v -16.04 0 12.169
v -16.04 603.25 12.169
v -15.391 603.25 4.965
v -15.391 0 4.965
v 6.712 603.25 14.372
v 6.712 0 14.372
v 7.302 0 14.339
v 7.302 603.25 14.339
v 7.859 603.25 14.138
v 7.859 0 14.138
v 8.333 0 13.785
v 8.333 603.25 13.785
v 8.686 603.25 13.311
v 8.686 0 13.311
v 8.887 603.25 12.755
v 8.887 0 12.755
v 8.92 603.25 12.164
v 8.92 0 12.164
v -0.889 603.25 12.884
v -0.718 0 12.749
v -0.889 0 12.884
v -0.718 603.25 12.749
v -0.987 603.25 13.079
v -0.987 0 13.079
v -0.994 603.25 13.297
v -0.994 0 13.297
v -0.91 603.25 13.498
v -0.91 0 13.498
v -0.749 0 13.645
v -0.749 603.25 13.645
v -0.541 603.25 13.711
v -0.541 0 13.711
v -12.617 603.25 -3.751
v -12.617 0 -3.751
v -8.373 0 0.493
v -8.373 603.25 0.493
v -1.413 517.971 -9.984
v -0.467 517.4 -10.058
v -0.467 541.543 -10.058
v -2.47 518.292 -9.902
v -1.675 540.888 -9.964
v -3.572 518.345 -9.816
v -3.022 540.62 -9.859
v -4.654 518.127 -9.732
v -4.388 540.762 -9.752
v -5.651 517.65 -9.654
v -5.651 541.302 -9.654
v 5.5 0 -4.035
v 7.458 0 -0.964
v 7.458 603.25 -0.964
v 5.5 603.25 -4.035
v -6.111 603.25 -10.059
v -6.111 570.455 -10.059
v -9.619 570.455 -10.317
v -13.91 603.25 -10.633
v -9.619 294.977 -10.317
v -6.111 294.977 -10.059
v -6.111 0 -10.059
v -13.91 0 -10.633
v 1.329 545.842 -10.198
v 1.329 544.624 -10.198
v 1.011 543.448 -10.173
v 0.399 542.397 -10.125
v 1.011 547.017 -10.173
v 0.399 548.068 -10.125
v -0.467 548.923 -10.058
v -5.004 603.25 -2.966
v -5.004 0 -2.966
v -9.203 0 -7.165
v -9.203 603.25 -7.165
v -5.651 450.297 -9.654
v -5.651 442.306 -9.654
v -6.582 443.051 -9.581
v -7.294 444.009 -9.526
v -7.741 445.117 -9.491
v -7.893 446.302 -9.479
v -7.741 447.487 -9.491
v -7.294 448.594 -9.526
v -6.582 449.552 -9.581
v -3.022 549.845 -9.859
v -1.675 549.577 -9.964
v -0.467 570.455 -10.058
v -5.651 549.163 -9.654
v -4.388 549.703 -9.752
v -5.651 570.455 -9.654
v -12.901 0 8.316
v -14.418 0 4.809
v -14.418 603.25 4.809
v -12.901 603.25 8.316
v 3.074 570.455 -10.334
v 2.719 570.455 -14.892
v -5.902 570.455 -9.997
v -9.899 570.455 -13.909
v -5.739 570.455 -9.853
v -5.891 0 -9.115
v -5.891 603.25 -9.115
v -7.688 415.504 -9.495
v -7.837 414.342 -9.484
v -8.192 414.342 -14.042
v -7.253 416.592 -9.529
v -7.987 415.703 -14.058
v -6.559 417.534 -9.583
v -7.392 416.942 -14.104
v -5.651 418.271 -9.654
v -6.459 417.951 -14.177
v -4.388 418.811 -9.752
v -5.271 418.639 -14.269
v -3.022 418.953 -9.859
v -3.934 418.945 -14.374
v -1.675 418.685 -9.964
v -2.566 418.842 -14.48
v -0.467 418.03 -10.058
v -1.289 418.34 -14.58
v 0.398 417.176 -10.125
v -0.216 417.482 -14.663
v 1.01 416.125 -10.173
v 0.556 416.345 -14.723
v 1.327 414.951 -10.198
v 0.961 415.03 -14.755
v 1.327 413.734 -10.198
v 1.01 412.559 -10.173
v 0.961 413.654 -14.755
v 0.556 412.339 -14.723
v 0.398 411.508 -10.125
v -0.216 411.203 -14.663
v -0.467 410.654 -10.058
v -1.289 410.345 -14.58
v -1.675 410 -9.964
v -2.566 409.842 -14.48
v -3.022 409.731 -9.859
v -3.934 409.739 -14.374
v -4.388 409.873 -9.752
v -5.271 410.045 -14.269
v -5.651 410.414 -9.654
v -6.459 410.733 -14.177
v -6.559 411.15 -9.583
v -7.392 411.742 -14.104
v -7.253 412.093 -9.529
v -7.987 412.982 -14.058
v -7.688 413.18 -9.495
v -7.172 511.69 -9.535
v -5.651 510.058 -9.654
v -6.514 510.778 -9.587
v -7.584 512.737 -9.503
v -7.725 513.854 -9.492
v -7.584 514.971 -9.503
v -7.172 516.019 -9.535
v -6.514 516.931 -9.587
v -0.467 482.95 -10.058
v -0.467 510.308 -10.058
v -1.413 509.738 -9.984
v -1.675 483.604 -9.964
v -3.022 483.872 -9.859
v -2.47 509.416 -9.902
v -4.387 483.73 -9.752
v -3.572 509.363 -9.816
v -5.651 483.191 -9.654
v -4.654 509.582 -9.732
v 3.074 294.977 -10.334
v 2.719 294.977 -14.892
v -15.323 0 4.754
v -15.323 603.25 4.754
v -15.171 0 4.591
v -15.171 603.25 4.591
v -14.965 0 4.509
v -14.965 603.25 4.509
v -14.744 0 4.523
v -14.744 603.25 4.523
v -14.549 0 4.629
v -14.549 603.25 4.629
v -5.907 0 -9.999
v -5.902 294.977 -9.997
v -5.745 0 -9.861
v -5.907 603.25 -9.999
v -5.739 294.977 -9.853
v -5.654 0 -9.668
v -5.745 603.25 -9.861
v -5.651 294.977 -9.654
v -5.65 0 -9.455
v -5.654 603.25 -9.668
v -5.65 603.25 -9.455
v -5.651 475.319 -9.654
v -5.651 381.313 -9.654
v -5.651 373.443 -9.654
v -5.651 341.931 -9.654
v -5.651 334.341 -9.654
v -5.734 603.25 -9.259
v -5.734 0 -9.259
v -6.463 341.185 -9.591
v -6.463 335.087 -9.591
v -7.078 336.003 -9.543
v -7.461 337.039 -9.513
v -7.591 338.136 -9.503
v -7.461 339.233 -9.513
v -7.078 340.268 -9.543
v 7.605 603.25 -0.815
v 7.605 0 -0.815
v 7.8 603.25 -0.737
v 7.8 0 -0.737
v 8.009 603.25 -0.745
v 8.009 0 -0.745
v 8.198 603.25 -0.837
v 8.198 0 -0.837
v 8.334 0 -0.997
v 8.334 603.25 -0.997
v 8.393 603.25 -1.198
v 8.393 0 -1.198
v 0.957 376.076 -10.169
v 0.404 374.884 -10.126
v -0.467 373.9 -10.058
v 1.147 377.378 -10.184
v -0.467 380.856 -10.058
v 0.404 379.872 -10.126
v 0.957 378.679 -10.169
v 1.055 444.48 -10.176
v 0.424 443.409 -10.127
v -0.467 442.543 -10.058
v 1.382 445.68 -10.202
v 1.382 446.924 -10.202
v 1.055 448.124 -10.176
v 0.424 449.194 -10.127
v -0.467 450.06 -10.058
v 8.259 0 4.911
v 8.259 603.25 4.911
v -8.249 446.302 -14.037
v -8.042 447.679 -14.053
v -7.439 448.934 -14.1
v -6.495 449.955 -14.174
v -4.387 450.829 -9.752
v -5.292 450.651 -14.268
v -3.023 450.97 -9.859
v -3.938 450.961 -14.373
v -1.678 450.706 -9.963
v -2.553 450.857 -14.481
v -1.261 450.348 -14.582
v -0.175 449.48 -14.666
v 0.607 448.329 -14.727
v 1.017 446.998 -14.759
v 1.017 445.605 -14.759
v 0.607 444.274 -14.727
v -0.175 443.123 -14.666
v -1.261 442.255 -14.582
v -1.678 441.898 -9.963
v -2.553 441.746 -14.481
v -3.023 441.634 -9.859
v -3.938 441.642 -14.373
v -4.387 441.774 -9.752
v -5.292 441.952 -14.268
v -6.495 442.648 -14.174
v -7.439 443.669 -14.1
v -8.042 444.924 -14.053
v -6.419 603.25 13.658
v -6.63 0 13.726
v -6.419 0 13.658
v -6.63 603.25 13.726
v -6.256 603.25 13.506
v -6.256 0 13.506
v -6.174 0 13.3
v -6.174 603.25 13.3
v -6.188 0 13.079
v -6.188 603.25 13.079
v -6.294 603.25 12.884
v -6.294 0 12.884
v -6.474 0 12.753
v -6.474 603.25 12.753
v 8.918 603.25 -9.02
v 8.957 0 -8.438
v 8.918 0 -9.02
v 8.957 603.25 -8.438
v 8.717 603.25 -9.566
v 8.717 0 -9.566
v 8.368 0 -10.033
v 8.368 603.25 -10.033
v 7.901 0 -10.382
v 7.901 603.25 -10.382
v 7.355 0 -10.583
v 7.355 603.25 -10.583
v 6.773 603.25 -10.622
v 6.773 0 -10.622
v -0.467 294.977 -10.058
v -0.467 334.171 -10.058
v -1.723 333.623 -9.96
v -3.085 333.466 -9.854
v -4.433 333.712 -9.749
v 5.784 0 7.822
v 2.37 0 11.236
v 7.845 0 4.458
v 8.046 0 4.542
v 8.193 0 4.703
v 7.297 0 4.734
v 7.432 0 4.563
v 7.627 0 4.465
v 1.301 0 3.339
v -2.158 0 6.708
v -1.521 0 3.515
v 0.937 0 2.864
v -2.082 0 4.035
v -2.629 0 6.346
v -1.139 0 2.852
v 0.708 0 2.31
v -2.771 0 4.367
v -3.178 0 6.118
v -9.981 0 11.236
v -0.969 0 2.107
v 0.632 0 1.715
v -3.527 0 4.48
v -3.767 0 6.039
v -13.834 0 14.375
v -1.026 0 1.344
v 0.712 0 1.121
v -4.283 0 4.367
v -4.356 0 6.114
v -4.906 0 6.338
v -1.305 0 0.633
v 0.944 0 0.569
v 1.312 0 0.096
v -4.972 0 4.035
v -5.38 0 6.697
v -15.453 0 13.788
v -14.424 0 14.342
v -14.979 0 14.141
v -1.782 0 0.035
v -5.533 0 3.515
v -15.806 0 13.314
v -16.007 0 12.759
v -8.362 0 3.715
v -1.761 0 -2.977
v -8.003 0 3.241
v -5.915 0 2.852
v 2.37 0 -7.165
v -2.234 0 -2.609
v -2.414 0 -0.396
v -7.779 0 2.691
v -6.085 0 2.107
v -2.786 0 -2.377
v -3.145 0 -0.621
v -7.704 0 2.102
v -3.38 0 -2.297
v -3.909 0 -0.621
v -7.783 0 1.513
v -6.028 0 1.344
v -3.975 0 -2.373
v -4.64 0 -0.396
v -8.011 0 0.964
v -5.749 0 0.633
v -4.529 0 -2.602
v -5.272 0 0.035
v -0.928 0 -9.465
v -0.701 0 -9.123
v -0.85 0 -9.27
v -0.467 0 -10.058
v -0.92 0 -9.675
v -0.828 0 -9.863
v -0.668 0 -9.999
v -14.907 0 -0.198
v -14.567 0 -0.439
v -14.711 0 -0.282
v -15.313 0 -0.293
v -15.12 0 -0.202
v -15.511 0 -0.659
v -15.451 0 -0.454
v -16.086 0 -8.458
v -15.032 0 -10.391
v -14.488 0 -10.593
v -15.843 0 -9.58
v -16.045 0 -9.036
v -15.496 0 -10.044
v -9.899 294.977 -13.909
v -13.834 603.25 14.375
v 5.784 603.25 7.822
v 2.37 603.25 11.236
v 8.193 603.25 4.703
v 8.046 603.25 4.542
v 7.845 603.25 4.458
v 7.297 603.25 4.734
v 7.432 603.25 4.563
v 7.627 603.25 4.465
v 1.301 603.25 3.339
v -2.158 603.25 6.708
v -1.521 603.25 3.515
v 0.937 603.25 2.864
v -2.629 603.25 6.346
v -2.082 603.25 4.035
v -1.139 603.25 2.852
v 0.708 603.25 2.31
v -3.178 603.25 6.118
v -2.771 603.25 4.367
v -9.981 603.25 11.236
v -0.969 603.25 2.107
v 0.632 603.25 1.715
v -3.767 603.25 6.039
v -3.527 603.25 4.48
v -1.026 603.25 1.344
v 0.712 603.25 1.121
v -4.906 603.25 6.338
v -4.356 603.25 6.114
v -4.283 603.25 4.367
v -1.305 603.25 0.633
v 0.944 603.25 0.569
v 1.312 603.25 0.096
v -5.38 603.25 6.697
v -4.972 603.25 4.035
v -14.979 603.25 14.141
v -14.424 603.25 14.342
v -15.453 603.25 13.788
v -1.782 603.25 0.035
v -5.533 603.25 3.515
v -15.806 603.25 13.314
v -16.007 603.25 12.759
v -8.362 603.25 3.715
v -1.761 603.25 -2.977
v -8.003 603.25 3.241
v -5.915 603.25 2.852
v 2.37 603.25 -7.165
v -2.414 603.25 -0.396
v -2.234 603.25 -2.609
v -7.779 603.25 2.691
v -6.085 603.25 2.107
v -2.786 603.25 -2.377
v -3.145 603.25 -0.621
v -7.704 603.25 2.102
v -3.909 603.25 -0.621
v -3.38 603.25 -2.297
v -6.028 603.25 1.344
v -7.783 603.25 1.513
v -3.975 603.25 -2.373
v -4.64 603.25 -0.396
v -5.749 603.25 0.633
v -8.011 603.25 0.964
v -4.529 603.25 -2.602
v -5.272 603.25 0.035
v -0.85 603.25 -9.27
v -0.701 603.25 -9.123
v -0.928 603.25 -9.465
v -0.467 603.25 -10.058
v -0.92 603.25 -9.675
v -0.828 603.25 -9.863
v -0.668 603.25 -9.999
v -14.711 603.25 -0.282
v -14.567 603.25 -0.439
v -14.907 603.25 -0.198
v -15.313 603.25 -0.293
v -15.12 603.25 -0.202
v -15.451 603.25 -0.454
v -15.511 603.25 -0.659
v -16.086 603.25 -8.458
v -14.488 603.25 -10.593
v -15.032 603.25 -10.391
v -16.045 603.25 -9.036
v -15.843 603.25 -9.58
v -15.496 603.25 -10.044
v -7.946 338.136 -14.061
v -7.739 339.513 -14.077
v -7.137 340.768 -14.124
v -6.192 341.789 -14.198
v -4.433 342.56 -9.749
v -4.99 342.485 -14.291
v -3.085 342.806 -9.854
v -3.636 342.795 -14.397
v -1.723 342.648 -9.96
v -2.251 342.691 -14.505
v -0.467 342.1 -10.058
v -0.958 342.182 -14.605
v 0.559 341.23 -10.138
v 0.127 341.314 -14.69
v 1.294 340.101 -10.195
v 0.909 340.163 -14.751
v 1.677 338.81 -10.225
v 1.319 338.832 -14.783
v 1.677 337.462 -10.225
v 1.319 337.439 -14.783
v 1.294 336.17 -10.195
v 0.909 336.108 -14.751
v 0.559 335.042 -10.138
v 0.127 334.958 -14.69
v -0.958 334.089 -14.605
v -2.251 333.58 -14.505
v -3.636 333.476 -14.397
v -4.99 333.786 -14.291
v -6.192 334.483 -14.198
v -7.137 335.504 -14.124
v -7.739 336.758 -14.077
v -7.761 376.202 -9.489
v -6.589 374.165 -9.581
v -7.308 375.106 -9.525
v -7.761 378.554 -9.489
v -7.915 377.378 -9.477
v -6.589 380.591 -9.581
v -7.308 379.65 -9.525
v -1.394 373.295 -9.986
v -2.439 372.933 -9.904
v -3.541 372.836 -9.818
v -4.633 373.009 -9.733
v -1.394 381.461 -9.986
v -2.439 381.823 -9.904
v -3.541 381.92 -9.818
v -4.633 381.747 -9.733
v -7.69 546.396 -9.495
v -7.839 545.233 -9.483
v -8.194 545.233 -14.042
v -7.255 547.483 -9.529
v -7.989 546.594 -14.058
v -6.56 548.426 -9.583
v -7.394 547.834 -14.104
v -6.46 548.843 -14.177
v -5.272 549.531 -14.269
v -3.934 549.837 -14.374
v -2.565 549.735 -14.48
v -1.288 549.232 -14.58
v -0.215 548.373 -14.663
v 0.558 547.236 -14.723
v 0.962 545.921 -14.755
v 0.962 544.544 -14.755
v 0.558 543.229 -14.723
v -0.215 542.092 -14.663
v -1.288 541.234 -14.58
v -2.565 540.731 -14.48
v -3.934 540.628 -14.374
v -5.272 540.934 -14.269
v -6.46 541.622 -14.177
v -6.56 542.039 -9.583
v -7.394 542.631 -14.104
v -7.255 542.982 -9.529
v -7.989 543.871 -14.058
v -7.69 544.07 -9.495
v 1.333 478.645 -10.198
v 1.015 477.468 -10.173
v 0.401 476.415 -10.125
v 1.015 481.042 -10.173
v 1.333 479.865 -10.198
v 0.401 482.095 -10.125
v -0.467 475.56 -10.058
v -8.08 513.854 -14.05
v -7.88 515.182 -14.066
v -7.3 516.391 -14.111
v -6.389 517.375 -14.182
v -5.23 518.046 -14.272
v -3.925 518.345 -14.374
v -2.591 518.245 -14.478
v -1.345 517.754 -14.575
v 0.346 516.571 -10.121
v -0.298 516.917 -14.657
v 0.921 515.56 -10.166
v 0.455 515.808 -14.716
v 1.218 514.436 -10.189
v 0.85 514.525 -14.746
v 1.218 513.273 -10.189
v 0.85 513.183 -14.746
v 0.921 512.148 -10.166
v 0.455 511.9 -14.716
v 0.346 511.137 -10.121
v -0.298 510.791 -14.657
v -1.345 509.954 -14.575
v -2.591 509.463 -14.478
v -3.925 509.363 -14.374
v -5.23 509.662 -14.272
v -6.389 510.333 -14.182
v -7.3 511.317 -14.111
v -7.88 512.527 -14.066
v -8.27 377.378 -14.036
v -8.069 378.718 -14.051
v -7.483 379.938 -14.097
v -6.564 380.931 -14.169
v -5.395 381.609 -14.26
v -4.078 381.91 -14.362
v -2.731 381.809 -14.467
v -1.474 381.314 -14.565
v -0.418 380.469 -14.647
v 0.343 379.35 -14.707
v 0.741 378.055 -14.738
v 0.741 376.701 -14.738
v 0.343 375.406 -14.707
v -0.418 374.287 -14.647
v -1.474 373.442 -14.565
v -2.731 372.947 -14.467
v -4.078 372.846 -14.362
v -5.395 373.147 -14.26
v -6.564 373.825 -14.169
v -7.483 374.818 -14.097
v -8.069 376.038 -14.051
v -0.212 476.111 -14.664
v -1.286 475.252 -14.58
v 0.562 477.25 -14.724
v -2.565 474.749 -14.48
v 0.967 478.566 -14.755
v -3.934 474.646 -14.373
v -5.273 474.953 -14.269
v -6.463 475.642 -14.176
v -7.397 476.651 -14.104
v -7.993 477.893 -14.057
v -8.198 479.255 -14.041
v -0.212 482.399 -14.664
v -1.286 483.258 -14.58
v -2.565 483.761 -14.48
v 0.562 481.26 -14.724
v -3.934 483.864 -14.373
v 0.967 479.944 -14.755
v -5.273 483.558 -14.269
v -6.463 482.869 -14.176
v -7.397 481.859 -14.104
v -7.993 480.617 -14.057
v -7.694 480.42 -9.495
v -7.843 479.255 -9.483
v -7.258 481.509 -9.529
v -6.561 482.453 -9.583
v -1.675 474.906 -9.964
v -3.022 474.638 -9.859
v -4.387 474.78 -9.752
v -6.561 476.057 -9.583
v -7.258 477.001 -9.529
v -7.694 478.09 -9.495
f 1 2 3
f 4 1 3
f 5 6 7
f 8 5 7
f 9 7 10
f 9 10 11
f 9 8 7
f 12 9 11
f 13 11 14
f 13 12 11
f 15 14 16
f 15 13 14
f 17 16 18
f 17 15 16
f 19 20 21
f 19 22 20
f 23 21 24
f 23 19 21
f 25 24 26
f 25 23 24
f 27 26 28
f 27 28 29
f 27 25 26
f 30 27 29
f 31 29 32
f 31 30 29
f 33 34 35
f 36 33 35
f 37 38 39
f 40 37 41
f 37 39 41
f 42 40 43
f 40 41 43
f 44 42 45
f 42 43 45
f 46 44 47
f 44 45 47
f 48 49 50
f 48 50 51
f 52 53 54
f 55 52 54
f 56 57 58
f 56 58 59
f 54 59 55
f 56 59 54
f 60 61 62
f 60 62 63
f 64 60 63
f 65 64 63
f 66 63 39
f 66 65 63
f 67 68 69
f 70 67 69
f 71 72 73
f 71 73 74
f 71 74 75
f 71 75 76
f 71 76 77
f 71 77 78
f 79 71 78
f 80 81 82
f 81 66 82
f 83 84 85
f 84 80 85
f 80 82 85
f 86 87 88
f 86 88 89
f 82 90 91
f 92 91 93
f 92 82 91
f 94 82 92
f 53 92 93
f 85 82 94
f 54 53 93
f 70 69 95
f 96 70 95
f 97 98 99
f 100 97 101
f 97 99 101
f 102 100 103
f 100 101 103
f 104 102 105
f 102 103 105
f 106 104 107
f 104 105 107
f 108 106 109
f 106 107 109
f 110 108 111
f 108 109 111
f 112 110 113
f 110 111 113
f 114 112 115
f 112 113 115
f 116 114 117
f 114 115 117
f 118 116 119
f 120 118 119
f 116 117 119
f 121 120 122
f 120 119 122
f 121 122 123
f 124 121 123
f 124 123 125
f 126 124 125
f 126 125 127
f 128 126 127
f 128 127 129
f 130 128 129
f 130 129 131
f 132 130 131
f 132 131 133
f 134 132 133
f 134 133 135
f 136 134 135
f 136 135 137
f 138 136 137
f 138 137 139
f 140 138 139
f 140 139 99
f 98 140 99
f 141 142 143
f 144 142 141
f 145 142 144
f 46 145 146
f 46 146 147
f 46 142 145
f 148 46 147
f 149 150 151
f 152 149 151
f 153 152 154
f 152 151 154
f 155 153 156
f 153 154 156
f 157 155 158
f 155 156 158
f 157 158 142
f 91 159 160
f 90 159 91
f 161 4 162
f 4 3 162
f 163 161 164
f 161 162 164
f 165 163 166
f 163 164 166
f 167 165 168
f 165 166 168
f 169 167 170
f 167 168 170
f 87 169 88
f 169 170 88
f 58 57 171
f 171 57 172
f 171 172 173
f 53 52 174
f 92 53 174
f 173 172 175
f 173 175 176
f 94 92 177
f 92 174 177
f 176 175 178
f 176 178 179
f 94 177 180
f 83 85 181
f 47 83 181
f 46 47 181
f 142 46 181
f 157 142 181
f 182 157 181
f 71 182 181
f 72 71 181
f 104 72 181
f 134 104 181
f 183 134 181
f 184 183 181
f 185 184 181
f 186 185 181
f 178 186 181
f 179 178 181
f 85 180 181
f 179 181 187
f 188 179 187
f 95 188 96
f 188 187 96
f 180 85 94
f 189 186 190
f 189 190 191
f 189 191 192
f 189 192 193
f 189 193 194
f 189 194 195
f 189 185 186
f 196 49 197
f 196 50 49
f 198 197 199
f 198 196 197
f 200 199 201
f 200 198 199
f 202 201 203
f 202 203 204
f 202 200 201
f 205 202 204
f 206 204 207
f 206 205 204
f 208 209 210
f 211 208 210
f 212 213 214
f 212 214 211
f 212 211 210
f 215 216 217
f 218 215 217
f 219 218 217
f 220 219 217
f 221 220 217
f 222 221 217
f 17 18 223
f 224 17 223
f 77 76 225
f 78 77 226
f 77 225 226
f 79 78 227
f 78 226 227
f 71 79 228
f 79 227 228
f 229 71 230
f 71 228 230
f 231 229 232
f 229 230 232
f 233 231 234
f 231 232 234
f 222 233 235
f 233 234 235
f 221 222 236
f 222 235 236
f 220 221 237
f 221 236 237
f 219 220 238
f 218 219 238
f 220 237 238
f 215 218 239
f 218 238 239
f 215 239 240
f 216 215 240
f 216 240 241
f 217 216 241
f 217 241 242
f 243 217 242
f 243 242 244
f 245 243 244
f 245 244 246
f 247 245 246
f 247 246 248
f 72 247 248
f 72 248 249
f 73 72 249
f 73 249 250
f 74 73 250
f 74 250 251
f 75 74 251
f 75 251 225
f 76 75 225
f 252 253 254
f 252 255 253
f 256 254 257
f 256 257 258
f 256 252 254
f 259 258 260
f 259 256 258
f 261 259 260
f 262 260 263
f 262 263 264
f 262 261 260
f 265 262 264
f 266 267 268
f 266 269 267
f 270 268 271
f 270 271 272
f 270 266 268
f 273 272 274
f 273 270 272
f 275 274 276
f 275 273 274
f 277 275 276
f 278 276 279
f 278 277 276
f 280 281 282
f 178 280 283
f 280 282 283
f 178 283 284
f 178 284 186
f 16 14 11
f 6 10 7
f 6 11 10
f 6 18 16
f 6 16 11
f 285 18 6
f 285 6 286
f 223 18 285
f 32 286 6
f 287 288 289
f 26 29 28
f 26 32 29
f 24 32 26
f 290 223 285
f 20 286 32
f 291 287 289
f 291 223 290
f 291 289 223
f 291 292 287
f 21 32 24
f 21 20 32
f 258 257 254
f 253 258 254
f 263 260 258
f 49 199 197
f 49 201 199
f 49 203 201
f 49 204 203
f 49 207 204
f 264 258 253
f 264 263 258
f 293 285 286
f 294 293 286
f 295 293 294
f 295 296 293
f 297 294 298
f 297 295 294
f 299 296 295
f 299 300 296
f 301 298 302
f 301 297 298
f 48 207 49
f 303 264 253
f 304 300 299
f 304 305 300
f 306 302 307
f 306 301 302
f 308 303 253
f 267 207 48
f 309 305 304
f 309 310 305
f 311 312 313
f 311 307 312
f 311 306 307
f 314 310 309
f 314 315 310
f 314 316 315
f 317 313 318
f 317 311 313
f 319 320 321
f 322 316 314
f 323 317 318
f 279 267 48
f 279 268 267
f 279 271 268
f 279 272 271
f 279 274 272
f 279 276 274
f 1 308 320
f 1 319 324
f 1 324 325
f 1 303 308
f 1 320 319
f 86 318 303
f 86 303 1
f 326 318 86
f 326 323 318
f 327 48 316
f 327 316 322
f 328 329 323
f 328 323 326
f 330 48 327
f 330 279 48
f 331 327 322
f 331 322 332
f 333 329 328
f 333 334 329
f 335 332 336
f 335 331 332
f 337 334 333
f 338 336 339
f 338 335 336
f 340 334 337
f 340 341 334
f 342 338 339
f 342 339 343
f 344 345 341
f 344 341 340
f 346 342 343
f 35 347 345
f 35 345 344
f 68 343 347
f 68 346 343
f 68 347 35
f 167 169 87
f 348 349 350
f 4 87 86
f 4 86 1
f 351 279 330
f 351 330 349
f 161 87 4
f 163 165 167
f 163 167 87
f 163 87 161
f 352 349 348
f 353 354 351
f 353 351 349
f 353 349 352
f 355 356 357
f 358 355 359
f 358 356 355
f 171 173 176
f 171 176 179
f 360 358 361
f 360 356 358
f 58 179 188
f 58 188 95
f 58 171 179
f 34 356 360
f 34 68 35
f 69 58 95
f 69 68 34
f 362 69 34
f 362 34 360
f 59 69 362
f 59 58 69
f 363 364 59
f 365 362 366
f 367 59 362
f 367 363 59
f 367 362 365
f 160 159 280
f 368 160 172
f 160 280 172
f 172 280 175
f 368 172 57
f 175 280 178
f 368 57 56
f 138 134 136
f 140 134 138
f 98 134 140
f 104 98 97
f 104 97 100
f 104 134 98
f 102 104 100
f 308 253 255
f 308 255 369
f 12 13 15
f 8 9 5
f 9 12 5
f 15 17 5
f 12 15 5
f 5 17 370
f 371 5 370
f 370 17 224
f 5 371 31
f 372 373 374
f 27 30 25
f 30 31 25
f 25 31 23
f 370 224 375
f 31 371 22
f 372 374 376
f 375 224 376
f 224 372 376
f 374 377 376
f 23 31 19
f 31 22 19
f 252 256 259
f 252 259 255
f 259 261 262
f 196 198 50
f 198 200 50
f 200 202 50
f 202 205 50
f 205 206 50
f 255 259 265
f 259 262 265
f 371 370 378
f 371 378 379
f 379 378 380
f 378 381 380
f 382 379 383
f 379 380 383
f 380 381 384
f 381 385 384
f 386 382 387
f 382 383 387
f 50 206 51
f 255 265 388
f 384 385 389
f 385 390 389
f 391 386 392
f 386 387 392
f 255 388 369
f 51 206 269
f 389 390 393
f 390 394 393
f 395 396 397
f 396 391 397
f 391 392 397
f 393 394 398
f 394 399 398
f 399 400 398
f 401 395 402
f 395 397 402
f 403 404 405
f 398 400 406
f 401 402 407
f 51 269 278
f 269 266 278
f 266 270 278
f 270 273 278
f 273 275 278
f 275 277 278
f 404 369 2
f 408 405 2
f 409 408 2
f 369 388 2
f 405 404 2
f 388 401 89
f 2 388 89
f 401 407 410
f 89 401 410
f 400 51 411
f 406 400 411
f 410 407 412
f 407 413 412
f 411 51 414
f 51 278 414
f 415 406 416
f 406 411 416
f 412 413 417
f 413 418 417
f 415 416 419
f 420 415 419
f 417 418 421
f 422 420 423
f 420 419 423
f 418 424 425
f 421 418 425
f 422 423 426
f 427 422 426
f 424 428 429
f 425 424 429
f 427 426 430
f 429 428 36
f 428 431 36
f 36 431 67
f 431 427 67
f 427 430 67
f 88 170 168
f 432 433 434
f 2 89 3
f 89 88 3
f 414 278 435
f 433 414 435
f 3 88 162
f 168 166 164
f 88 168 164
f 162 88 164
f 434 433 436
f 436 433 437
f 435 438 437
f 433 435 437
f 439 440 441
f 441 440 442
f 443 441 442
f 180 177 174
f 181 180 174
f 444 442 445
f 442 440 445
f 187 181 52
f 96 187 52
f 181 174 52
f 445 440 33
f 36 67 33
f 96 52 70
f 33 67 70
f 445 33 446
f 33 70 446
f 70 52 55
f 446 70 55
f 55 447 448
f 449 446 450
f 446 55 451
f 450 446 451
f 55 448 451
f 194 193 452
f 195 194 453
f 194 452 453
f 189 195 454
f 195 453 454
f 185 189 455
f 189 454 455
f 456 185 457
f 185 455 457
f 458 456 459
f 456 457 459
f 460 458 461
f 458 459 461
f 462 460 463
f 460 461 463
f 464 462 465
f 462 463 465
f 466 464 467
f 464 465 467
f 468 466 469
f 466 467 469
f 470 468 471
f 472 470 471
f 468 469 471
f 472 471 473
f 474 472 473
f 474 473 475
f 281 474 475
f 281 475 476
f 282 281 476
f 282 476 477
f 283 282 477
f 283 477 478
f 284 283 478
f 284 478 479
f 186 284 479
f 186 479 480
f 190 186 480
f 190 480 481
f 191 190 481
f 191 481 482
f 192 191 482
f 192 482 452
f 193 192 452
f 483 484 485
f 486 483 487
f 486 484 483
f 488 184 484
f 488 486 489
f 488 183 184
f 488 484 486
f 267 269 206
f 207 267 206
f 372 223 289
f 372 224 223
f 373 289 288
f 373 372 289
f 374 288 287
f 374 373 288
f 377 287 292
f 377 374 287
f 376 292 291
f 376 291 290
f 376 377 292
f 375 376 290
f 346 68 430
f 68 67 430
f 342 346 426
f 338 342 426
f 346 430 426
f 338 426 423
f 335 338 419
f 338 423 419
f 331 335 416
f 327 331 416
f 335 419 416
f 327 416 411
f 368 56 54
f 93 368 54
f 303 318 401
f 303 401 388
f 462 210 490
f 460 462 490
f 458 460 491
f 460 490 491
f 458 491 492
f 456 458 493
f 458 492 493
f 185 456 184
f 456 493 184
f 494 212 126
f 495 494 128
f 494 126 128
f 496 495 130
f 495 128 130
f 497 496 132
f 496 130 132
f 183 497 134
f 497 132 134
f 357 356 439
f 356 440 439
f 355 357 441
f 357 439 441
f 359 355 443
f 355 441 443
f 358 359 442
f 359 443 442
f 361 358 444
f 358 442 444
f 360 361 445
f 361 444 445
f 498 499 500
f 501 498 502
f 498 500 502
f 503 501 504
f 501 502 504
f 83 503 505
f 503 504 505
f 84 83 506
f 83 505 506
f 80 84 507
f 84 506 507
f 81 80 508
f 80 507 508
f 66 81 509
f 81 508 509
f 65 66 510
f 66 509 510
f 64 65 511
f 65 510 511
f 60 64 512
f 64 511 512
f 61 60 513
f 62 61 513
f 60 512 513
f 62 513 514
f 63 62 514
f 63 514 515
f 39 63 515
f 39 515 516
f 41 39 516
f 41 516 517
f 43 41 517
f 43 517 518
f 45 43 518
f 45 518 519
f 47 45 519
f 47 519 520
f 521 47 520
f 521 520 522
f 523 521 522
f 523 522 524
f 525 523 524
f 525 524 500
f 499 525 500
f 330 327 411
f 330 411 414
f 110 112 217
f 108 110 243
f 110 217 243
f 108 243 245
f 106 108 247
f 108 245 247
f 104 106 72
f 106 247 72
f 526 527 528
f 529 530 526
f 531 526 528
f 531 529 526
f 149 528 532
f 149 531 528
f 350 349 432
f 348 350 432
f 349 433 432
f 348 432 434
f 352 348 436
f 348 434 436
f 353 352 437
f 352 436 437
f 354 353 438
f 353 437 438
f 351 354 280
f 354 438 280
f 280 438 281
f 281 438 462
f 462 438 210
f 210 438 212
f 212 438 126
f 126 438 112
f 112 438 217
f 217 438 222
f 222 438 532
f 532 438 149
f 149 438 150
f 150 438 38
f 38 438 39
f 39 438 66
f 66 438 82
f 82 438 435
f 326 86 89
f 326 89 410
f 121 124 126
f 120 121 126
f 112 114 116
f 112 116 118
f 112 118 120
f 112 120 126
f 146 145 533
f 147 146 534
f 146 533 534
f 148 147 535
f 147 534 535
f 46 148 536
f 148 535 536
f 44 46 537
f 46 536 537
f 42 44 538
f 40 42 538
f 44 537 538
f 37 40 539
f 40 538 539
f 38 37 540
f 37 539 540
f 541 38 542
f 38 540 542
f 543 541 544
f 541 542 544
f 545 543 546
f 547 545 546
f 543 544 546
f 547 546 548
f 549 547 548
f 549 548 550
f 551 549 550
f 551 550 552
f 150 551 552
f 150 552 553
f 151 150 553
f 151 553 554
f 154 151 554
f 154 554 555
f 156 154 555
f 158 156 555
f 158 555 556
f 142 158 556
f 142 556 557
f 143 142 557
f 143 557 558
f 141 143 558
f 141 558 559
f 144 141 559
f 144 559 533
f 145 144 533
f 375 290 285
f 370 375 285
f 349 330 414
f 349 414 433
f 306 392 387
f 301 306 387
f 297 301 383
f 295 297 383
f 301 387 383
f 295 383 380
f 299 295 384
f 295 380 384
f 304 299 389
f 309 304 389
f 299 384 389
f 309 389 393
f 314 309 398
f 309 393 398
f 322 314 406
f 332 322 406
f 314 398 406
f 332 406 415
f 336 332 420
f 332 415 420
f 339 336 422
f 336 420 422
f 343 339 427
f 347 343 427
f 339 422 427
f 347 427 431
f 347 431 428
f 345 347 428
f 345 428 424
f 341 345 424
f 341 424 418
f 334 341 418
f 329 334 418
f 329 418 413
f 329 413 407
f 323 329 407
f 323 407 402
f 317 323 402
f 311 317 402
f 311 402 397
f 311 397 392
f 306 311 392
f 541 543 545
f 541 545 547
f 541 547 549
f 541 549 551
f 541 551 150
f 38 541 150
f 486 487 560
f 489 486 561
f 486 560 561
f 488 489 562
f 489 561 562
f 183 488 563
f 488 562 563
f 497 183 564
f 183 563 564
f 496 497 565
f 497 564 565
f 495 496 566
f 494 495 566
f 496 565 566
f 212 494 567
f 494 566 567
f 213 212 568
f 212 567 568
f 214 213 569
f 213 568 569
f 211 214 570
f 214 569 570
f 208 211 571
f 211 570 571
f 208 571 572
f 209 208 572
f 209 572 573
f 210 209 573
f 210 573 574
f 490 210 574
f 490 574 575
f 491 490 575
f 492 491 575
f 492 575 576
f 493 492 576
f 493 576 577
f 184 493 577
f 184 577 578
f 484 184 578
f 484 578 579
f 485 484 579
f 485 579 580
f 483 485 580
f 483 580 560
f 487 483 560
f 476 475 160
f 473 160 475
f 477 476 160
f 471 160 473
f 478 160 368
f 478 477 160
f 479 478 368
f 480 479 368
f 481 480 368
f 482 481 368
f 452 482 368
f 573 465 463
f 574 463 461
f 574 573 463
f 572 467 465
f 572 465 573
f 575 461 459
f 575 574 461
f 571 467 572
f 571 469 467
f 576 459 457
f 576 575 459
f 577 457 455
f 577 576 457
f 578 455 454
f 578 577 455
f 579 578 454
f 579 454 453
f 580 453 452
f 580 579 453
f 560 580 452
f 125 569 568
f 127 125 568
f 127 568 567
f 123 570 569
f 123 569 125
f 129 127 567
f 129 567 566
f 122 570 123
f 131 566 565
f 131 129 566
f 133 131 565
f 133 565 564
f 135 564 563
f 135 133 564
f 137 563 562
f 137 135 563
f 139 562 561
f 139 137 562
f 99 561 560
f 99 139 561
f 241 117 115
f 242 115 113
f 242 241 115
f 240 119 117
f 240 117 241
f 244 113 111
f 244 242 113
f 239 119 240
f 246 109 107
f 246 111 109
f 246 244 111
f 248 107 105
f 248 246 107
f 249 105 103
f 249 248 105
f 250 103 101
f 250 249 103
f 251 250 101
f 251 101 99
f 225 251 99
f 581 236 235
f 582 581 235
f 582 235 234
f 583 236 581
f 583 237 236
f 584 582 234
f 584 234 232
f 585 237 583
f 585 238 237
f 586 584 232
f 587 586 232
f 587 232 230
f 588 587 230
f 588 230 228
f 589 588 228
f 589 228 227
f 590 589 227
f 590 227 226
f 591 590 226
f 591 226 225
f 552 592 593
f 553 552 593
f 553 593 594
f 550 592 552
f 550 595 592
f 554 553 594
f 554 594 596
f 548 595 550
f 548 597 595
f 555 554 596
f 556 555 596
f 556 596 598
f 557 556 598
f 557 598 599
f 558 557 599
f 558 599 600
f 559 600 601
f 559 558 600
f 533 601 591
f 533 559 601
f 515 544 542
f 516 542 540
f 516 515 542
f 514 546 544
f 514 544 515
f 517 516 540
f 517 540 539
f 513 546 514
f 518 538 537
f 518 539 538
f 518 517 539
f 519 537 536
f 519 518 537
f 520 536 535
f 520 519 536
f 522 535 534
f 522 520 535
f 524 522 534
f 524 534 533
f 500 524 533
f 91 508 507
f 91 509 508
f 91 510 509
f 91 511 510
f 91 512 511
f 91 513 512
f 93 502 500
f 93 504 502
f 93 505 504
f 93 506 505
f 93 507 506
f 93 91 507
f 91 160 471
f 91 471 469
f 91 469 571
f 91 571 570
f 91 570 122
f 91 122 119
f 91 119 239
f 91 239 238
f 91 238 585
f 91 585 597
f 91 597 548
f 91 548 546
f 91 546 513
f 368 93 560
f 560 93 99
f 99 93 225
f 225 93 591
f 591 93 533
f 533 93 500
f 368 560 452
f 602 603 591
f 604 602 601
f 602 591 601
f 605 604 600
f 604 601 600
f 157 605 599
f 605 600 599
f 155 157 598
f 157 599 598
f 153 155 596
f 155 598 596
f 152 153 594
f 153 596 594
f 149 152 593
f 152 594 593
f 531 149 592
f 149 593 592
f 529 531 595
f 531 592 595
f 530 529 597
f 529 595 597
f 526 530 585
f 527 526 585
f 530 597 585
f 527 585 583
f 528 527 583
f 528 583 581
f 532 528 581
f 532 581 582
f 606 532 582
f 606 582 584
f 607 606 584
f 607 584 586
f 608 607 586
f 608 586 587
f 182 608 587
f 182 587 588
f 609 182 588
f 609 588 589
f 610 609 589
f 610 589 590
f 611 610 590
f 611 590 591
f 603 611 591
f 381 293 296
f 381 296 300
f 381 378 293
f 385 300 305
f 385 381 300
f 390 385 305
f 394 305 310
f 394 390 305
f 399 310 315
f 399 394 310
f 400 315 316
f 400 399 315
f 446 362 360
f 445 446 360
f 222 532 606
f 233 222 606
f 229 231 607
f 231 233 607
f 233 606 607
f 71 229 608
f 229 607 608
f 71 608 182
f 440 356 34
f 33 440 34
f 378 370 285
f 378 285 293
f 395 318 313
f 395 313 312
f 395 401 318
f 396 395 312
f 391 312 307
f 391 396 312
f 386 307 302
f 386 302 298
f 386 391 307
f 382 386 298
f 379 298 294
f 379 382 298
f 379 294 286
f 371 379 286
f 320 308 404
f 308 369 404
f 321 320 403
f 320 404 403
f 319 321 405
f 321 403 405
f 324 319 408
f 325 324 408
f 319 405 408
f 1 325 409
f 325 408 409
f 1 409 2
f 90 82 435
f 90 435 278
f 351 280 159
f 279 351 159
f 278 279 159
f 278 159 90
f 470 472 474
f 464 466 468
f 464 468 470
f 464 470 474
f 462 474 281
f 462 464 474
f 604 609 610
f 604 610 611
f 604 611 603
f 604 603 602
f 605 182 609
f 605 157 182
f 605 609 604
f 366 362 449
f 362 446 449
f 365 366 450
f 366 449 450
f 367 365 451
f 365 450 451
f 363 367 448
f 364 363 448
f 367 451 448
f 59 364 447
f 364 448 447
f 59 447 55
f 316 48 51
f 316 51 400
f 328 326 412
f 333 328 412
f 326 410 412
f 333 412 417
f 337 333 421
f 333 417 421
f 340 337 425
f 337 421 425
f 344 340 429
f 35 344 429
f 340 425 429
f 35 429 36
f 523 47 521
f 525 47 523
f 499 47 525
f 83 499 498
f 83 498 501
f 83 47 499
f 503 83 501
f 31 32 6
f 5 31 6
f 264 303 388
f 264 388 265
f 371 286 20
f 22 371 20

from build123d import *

# Parameters (mm, degrees)
BOSS_EXTRUDE1_DEPTH = 603.25
SKETCH8_R           = 2.565266714
CUT_EXTRUDE4_DEPTH  = 604.996
FILLET1_R           = 2.032
FILLET2_R           = 0.508
SKETCH5_W           = 12.655737404
SKETCH5_H           = 275.477439744
BOSS_EXTRUDE3_DEPTH = 4.572
SKETCH6_R           = 4.617709461
SKETCH6_R_2         = 4.503643825
SKETCH6_R_3         = 4.621904919
SKETCH6_R_4         = 4.672748293
SKETCH6_R_5         = 4.615964847
CUT_EXTRUDE2_DEPTH  = 4.572
SKETCH7_R           = 4.54487388
SKETCH7_R_2         = 4.672668652
CUT_EXTRUDE3_DEPTH  = 4.572
FILLET3_R           = 2.286


with BuildPart() as part:
    # Sketch2 → Boss-Extrude1 (new body)
    with BuildSketch(Plane(origin=(0, 0, 0), x_dir=(1, 0, 0), z_dir=(0, 1, 0))):
        Polygon((-16.258611825, -14.593573265), (-15.211300169, -2.97584616), (-12.901409331, -8.316313776), (2.370242199, 7.164742979), (-1.981461576, 9.939777323), (9.141388175, 10.806426735), (8.274738763, -0.316423015), (5.499704418, 4.03528076), (-9.981352337, -11.236370771), (-4.640884721, -13.546261608), align=None)
        Polygon((-15.391962413, -0.962649654), (-12.616928069, 3.750799497), (2.370242199, -11.236370771), (-2.346798037, -13.546261608), (9.141388175, -14.593573265), (8.094076519, -3.105387053), (5.784185681, -7.822427289), (-9.202984587, 7.164742979), (-4.489535436, 9.939777323), (-16.258611825, 10.806426735), align=None)
    extrude(amount=BOSS_EXTRUDE1_DEPTH)

    # Sketch8 → Cut-Extrude4 (cut)
    with BuildSketch(Plane(origin=(0, 603.25, 0), x_dir=(1, 0, 0), z_dir=(0, 1, 0))):
        with Locations(Location((-3.527048706, -1.915222876, 0), (0, 0, 270))):
            Circle(SKETCH8_R)
    extrude(amount=-CUT_EXTRUDE4_DEPTH, mode=Mode.SUBTRACT)

    # Fillet1
    fillet1_edges = [part.edges().sort_by_distance(p)[0] for p in [
        (9.141388175, 301.625, -10.806426735),
        (9.141388175, 301.625, 14.593573265),
        (-16.258611825, 301.625, 14.593573265),
        (-16.258611825, 301.625, -10.806426735),
    ]]
    fillet(fillet1_edges, radius=FILLET1_R)

    # Fillet2
    fillet2_edges = [part.edges().sort_by_distance(p)[0] for p in [
        (-1.981461576, 301.625, -9.939777323),
        (8.274738763, 301.625, 0.316423015),
        (8.094076519, 301.625, 3.105387053),
        (-2.346798037, 301.625, 13.546261608),
        (-4.640884721, 301.625, 13.546261608),
        (-15.211300169, 301.625, 2.97584616),
        (-15.391962413, 301.625, 0.962649654),
        (-4.489535436, 301.625, -9.939777323),
    ]]
    fillet(fillet2_edges, radius=FILLET2_R)

    # Sketch5 → Boss-Extrude3 (add)
    with BuildSketch(Plane(origin=(-0.781752329, 0, -10.033254025), x_dir=(-0.9969782897972478, 0, 0.07768069047681715), z_dir=(-0.07768069047681715, 0, -0.9969782897972478))):
        with Locations((2.46042797, 432.716085527)):
            Rectangle(SKETCH5_W, SKETCH5_H)
    extrude(amount=BOSS_EXTRUDE3_DEPTH)

    # Sketch6 → Cut-Extrude2 (cut)
    with BuildSketch(Plane(origin=(-1.136908446, 0, -14.591438766), x_dir=(-0.9969782897972478, 0, 0.07768069047681722), z_dir=(-0.07768069047681722, 0, -0.9969782897972478))):
        with Locations((2.46042797, 545.232588529)):
            Circle(SKETCH6_R)
        with Locations((2.46042797, 513.854170907)):
            Circle(SKETCH6_R_2)
        with Locations((2.46042797, 479.255100803)):
            Circle(SKETCH6_R_3)
        with Locations((2.46042797, 446.301604006)):
            Circle(SKETCH6_R_4)
        with Locations((2.46042797, 414.342225806)):
            Circle(SKETCH6_R_5)
    extrude(amount=-CUT_EXTRUDE2_DEPTH, mode=Mode.SUBTRACT)

    # Sketch7 → Cut-Extrude3 (cut)
    with BuildSketch(Plane(origin=(-1.136908446, 0, -14.591438766), x_dir=(-0.9969782897972478, 0, 0.07768069047681712), z_dir=(-0.07768069047681712, 0, -0.9969782897972478))):
        with Locations((2.610241648, 377.377881706)):
            Circle(SKETCH7_R)
        with Locations((2.157369038, 338.135767483)):
            Circle(SKETCH7_R_2)
    extrude(amount=-CUT_EXTRUDE3_DEPTH, mode=Mode.SUBTRACT)

    # Fillet3
    fillet3_edges = [part.edges().sort_by_distance(p)[0] for p in [
        (-0.326311914, 301.625, 1.711929695),
        (-6.767665082, 301.625, 2.09846349),
        (-3.376968255, 301.625, -1.338726647),
        (-3.76350205, 301.625, 5.102626521),
    ]]
    fillet(fillet3_edges, radius=FILLET3_R)


solid = part.part
